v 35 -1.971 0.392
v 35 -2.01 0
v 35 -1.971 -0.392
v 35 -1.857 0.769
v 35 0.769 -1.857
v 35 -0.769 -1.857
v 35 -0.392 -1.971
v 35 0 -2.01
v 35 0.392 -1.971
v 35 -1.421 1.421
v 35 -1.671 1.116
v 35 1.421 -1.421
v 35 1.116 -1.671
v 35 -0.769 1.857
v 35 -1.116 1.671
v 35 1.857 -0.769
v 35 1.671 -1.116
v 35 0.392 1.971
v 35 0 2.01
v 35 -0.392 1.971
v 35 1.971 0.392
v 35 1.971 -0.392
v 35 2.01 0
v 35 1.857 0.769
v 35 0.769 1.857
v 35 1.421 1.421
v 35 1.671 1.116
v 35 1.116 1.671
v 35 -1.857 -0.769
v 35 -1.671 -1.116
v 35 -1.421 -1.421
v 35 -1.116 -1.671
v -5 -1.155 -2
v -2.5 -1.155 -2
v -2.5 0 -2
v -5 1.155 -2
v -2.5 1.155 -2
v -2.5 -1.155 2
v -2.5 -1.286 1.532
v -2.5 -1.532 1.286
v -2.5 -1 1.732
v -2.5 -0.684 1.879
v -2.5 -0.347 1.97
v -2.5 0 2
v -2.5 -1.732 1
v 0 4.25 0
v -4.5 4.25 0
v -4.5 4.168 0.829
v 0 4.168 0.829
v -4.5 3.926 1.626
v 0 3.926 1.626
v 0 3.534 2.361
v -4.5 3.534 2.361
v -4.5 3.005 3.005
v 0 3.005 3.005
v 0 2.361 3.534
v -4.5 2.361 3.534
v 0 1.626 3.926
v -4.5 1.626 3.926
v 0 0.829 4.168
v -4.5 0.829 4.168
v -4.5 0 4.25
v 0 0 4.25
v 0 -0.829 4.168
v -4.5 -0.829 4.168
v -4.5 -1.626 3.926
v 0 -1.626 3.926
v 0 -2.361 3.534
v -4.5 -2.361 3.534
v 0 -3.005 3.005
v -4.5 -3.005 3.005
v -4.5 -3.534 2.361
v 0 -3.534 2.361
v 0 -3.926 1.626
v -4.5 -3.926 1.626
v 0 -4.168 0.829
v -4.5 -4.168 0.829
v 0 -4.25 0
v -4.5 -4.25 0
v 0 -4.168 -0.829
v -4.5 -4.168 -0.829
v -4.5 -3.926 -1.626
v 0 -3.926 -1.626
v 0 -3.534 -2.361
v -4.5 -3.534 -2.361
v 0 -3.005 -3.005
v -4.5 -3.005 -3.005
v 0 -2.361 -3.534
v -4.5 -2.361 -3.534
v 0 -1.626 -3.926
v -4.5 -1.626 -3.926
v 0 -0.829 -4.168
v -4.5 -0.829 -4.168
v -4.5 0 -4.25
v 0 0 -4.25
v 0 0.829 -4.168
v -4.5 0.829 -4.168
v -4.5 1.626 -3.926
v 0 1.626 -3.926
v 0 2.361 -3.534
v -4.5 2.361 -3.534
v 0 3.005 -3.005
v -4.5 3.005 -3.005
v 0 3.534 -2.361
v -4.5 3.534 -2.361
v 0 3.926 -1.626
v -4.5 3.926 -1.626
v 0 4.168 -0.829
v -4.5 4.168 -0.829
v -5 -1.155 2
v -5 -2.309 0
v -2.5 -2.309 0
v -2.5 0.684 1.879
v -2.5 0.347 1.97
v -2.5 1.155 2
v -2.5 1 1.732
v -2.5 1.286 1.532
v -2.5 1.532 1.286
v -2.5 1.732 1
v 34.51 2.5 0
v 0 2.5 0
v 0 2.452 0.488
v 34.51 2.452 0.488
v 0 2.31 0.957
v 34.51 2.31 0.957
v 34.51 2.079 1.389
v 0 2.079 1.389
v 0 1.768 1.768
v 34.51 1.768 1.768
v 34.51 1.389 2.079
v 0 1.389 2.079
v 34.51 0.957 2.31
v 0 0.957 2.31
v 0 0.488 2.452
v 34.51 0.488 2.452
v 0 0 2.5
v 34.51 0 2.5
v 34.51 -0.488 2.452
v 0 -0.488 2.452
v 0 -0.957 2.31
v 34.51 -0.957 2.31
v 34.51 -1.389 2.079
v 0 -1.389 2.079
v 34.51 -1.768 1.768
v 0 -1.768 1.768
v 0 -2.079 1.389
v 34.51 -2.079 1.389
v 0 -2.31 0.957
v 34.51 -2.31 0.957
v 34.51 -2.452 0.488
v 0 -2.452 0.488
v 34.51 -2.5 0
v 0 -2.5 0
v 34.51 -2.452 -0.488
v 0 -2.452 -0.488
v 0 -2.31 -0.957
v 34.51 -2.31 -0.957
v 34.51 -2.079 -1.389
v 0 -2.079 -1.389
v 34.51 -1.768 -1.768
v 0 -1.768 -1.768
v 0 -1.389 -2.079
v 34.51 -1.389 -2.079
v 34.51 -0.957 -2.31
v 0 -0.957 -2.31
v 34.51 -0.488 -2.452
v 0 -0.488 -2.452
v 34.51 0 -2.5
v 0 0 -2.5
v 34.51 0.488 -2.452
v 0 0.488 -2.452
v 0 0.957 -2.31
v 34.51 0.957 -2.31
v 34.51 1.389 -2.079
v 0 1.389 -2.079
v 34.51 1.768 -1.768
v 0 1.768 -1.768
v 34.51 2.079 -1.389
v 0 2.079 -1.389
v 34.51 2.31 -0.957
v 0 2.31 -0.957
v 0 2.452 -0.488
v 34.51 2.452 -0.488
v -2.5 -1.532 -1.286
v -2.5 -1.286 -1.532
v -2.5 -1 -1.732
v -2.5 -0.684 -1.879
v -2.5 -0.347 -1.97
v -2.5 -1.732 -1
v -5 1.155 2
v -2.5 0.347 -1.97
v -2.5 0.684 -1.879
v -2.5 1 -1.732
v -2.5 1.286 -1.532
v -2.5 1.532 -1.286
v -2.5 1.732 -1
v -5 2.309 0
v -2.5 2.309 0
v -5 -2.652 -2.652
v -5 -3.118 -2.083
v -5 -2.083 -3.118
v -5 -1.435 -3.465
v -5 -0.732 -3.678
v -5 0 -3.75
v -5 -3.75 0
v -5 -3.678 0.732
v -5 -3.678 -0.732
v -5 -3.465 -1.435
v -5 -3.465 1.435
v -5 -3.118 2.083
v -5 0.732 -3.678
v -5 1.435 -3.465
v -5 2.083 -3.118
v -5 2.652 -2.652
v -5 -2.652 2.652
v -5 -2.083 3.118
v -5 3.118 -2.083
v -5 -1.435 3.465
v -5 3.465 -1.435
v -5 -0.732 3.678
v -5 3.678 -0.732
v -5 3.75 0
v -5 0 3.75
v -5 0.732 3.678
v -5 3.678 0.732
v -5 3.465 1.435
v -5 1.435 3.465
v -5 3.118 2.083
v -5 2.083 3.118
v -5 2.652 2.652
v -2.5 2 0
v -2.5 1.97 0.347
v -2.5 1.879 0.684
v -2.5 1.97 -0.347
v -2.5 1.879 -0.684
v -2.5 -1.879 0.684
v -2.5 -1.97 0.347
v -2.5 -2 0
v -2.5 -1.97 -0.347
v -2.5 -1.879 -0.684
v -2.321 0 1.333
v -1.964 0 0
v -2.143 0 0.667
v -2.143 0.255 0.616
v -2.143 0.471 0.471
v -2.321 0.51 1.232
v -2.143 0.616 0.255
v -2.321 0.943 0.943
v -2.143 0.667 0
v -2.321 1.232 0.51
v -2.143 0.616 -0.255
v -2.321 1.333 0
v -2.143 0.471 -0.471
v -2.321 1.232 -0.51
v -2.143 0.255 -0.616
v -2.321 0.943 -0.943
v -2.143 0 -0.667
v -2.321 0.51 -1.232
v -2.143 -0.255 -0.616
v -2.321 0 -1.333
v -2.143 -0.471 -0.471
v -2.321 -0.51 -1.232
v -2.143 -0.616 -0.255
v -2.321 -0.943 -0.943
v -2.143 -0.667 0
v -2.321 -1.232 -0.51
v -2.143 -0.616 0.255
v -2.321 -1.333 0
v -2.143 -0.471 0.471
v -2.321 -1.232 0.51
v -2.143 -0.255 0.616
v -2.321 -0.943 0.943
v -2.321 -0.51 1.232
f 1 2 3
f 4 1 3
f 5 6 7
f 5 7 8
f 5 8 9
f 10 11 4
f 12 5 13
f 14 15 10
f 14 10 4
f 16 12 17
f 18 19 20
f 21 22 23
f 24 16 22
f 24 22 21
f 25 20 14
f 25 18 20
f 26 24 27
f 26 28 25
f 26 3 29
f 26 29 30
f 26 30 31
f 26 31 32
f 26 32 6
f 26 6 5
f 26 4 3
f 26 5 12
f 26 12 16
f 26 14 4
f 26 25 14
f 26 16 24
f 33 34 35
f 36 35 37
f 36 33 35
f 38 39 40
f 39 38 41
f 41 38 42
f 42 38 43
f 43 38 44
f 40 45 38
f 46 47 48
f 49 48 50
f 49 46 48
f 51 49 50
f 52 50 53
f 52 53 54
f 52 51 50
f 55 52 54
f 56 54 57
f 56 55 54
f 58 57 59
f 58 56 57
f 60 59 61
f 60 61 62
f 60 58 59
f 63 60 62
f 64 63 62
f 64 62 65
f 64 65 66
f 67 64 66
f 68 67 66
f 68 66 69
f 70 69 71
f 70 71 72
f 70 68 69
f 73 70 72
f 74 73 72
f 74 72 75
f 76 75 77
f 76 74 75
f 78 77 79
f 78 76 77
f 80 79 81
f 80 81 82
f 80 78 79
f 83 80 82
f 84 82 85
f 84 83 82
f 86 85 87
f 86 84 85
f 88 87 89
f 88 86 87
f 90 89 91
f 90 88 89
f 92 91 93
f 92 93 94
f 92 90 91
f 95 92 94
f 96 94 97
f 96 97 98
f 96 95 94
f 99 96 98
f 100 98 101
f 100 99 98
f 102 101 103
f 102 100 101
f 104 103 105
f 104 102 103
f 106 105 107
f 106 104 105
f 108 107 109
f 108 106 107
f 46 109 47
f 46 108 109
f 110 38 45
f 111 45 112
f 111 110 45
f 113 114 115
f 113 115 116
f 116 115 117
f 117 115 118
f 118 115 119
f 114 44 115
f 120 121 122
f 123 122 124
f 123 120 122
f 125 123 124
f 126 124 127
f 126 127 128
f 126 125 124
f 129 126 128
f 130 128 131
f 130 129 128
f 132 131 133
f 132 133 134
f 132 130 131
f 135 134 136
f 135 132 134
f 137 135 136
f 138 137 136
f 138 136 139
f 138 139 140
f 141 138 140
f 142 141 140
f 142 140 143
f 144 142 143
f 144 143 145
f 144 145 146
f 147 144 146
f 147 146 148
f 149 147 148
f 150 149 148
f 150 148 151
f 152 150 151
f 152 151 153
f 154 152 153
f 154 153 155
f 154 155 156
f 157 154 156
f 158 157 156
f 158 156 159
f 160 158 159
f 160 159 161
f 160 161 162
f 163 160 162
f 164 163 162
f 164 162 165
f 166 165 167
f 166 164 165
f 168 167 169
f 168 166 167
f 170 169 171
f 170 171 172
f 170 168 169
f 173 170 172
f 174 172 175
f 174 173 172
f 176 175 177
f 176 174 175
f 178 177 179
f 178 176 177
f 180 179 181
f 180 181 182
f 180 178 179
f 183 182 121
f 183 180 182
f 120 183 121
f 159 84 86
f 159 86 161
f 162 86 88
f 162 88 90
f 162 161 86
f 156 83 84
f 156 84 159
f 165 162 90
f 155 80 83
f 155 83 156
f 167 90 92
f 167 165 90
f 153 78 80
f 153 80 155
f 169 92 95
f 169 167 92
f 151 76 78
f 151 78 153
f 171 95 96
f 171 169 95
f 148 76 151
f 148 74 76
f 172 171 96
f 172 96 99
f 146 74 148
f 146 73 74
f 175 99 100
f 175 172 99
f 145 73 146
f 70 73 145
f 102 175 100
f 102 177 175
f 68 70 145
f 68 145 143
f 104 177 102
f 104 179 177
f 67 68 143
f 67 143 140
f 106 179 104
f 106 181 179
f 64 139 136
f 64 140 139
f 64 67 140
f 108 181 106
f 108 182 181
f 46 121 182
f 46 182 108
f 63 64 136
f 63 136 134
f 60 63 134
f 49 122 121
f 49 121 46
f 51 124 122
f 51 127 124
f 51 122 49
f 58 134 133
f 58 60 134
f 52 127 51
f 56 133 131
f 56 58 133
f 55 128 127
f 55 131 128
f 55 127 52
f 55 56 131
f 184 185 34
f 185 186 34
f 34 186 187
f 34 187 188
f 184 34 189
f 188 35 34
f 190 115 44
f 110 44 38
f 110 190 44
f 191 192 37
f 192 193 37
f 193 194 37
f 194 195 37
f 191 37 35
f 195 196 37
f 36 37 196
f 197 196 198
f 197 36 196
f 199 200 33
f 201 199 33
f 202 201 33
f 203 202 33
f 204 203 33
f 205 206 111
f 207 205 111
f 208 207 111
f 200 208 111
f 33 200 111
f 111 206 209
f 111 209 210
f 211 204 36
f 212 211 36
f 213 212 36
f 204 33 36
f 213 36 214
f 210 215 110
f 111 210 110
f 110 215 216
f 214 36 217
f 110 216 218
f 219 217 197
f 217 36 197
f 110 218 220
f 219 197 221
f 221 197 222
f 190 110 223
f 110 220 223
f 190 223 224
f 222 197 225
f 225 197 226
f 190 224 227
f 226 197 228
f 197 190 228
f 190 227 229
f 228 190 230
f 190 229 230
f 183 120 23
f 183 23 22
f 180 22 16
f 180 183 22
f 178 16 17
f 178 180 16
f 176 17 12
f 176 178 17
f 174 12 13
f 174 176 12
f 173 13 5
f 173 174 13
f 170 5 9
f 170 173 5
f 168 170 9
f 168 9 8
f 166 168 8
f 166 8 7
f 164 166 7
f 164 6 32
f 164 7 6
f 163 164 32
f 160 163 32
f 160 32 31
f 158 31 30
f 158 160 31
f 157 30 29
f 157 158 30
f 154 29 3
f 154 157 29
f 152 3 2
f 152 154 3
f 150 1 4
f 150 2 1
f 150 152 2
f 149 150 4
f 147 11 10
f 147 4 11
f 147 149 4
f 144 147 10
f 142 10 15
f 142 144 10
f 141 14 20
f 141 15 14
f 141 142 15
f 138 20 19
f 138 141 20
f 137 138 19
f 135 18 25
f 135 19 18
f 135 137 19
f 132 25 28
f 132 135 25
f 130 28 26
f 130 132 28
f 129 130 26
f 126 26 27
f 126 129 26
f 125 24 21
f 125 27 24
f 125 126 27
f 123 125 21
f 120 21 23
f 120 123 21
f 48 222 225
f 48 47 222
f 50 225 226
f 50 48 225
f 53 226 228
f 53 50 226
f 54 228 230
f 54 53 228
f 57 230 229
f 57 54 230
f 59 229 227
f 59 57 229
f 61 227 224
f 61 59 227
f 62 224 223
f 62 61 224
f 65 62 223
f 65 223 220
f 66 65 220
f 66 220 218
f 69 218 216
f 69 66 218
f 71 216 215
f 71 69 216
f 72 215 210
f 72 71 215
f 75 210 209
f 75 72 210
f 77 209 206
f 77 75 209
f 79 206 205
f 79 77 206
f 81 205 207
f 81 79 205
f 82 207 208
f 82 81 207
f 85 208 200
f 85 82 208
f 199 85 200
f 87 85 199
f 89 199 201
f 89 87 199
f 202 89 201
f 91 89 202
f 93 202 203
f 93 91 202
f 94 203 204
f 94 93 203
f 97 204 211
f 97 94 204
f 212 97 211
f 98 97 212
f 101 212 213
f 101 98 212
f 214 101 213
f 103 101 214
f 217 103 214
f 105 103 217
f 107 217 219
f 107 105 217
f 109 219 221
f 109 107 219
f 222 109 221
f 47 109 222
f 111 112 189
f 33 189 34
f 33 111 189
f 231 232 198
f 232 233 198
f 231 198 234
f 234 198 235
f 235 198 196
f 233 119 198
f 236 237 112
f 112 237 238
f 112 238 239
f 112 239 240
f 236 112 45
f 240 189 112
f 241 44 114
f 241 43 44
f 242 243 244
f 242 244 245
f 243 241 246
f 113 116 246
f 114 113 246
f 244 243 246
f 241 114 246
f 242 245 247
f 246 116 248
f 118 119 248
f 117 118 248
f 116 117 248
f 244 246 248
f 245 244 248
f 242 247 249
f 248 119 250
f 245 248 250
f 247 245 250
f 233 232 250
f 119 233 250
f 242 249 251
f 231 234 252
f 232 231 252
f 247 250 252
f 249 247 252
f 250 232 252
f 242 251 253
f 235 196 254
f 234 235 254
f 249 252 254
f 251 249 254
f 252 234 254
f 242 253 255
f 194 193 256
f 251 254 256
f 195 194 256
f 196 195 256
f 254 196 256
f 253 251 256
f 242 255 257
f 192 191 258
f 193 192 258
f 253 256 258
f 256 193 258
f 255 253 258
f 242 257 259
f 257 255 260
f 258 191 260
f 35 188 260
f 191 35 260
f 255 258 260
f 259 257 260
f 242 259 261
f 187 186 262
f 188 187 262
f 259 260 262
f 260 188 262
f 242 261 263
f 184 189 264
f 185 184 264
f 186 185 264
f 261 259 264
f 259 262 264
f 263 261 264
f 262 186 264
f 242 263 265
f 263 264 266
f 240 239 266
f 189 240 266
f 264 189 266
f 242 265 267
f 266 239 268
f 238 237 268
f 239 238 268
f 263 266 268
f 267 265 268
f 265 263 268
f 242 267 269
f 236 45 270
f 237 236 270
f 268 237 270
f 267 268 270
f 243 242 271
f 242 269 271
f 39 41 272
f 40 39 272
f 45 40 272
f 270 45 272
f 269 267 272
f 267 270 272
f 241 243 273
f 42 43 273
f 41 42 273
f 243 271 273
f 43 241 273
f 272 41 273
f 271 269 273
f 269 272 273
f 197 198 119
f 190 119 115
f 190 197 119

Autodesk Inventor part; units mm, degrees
sketch "Sketch_2" plane through (0, 0, 0) normal (0, 0, 1) x (1, 0, 0)
  line L0 (35, 0) -> (-5, 0)
  line L1 (-5, 0) -> (-5, 3.75)
  line L2 (-5, 3.75) -> (-4.5, 4.25)
  line L3 (-4.5, 4.25) -> (0, 4.25)
  line L4 (0, 4.25) -> (0, 2.5)
  line L5 (0, 2.5) -> (34.5095, 2.5)
  line L6 (34.5095, 2.5) -> (35, 2.0095)
  line L7 (35, 2.0095) -> (35, 0)
  line L8 (35, 0) -> (-5, 0)
revolve "Revolution1" add sketch "Sketch_2" angle 360 about axis through (35, 0, 0) along (1, 0, 0)
thread "Thread1" size "M5x0.8" class "6g" standard "ISO Metric profile" length 21.5095
sketch "Sketch2" plane through (-5, 0, 0) normal (-1, 0, 0) x (0, 0, 1)
  point P0 (0, 0)
hole "Hole1" at (-5, 0, 0) direction (1, 0, 0) diameter 4 depth 2.5 tip angle 150
sketch "Sketch_3" plane through (-5, 0, 0) normal (1, 0, 0) x (0, 0, -1)
  line L0 (-2, -1.1547) -> (0, -2.3094)
  line L1 (0, -2.3094) -> (2, -1.1547)
  line L2 (2, -1.1547) -> (2, 1.1547)
  line L3 (2, 1.1547) -> (0, 2.3094)
  line L4 (0, 2.3094) -> (-2, 1.1547)
  line L5 (-2, 1.1547) -> (-2, -1.1547)
extrude "Extrusion1" cut sketch "Sketch_3" along normal blind 2.5
ref_plane "bolt_to_nut_XY" through (35, 0, 0) normal (1, 0, 0) x (0, 0, -1)
ref_plane "bolt_to_nut_YZ" through (35, 0, 0) normal (0, 0, -1) x (0, 1, 0)
ref_plane "bolt_to_nut_ZX" through (35, 0, 0) normal (0, 1, 0) x (1, 0, 0)
ref_plane "screw1_XY" through (0, 0, 0) normal (1, 0, 0) x (0, 0, -1)
ref_plane "screw1_YZ" through (0, 0, 0) normal (0, 0, -1) x (0, 1, 0)
ref_plane "screw1_ZX" through (0, 0, 0) normal (0, 1, 0) x (1, 0, 0)
properties part number "CB5-35"
